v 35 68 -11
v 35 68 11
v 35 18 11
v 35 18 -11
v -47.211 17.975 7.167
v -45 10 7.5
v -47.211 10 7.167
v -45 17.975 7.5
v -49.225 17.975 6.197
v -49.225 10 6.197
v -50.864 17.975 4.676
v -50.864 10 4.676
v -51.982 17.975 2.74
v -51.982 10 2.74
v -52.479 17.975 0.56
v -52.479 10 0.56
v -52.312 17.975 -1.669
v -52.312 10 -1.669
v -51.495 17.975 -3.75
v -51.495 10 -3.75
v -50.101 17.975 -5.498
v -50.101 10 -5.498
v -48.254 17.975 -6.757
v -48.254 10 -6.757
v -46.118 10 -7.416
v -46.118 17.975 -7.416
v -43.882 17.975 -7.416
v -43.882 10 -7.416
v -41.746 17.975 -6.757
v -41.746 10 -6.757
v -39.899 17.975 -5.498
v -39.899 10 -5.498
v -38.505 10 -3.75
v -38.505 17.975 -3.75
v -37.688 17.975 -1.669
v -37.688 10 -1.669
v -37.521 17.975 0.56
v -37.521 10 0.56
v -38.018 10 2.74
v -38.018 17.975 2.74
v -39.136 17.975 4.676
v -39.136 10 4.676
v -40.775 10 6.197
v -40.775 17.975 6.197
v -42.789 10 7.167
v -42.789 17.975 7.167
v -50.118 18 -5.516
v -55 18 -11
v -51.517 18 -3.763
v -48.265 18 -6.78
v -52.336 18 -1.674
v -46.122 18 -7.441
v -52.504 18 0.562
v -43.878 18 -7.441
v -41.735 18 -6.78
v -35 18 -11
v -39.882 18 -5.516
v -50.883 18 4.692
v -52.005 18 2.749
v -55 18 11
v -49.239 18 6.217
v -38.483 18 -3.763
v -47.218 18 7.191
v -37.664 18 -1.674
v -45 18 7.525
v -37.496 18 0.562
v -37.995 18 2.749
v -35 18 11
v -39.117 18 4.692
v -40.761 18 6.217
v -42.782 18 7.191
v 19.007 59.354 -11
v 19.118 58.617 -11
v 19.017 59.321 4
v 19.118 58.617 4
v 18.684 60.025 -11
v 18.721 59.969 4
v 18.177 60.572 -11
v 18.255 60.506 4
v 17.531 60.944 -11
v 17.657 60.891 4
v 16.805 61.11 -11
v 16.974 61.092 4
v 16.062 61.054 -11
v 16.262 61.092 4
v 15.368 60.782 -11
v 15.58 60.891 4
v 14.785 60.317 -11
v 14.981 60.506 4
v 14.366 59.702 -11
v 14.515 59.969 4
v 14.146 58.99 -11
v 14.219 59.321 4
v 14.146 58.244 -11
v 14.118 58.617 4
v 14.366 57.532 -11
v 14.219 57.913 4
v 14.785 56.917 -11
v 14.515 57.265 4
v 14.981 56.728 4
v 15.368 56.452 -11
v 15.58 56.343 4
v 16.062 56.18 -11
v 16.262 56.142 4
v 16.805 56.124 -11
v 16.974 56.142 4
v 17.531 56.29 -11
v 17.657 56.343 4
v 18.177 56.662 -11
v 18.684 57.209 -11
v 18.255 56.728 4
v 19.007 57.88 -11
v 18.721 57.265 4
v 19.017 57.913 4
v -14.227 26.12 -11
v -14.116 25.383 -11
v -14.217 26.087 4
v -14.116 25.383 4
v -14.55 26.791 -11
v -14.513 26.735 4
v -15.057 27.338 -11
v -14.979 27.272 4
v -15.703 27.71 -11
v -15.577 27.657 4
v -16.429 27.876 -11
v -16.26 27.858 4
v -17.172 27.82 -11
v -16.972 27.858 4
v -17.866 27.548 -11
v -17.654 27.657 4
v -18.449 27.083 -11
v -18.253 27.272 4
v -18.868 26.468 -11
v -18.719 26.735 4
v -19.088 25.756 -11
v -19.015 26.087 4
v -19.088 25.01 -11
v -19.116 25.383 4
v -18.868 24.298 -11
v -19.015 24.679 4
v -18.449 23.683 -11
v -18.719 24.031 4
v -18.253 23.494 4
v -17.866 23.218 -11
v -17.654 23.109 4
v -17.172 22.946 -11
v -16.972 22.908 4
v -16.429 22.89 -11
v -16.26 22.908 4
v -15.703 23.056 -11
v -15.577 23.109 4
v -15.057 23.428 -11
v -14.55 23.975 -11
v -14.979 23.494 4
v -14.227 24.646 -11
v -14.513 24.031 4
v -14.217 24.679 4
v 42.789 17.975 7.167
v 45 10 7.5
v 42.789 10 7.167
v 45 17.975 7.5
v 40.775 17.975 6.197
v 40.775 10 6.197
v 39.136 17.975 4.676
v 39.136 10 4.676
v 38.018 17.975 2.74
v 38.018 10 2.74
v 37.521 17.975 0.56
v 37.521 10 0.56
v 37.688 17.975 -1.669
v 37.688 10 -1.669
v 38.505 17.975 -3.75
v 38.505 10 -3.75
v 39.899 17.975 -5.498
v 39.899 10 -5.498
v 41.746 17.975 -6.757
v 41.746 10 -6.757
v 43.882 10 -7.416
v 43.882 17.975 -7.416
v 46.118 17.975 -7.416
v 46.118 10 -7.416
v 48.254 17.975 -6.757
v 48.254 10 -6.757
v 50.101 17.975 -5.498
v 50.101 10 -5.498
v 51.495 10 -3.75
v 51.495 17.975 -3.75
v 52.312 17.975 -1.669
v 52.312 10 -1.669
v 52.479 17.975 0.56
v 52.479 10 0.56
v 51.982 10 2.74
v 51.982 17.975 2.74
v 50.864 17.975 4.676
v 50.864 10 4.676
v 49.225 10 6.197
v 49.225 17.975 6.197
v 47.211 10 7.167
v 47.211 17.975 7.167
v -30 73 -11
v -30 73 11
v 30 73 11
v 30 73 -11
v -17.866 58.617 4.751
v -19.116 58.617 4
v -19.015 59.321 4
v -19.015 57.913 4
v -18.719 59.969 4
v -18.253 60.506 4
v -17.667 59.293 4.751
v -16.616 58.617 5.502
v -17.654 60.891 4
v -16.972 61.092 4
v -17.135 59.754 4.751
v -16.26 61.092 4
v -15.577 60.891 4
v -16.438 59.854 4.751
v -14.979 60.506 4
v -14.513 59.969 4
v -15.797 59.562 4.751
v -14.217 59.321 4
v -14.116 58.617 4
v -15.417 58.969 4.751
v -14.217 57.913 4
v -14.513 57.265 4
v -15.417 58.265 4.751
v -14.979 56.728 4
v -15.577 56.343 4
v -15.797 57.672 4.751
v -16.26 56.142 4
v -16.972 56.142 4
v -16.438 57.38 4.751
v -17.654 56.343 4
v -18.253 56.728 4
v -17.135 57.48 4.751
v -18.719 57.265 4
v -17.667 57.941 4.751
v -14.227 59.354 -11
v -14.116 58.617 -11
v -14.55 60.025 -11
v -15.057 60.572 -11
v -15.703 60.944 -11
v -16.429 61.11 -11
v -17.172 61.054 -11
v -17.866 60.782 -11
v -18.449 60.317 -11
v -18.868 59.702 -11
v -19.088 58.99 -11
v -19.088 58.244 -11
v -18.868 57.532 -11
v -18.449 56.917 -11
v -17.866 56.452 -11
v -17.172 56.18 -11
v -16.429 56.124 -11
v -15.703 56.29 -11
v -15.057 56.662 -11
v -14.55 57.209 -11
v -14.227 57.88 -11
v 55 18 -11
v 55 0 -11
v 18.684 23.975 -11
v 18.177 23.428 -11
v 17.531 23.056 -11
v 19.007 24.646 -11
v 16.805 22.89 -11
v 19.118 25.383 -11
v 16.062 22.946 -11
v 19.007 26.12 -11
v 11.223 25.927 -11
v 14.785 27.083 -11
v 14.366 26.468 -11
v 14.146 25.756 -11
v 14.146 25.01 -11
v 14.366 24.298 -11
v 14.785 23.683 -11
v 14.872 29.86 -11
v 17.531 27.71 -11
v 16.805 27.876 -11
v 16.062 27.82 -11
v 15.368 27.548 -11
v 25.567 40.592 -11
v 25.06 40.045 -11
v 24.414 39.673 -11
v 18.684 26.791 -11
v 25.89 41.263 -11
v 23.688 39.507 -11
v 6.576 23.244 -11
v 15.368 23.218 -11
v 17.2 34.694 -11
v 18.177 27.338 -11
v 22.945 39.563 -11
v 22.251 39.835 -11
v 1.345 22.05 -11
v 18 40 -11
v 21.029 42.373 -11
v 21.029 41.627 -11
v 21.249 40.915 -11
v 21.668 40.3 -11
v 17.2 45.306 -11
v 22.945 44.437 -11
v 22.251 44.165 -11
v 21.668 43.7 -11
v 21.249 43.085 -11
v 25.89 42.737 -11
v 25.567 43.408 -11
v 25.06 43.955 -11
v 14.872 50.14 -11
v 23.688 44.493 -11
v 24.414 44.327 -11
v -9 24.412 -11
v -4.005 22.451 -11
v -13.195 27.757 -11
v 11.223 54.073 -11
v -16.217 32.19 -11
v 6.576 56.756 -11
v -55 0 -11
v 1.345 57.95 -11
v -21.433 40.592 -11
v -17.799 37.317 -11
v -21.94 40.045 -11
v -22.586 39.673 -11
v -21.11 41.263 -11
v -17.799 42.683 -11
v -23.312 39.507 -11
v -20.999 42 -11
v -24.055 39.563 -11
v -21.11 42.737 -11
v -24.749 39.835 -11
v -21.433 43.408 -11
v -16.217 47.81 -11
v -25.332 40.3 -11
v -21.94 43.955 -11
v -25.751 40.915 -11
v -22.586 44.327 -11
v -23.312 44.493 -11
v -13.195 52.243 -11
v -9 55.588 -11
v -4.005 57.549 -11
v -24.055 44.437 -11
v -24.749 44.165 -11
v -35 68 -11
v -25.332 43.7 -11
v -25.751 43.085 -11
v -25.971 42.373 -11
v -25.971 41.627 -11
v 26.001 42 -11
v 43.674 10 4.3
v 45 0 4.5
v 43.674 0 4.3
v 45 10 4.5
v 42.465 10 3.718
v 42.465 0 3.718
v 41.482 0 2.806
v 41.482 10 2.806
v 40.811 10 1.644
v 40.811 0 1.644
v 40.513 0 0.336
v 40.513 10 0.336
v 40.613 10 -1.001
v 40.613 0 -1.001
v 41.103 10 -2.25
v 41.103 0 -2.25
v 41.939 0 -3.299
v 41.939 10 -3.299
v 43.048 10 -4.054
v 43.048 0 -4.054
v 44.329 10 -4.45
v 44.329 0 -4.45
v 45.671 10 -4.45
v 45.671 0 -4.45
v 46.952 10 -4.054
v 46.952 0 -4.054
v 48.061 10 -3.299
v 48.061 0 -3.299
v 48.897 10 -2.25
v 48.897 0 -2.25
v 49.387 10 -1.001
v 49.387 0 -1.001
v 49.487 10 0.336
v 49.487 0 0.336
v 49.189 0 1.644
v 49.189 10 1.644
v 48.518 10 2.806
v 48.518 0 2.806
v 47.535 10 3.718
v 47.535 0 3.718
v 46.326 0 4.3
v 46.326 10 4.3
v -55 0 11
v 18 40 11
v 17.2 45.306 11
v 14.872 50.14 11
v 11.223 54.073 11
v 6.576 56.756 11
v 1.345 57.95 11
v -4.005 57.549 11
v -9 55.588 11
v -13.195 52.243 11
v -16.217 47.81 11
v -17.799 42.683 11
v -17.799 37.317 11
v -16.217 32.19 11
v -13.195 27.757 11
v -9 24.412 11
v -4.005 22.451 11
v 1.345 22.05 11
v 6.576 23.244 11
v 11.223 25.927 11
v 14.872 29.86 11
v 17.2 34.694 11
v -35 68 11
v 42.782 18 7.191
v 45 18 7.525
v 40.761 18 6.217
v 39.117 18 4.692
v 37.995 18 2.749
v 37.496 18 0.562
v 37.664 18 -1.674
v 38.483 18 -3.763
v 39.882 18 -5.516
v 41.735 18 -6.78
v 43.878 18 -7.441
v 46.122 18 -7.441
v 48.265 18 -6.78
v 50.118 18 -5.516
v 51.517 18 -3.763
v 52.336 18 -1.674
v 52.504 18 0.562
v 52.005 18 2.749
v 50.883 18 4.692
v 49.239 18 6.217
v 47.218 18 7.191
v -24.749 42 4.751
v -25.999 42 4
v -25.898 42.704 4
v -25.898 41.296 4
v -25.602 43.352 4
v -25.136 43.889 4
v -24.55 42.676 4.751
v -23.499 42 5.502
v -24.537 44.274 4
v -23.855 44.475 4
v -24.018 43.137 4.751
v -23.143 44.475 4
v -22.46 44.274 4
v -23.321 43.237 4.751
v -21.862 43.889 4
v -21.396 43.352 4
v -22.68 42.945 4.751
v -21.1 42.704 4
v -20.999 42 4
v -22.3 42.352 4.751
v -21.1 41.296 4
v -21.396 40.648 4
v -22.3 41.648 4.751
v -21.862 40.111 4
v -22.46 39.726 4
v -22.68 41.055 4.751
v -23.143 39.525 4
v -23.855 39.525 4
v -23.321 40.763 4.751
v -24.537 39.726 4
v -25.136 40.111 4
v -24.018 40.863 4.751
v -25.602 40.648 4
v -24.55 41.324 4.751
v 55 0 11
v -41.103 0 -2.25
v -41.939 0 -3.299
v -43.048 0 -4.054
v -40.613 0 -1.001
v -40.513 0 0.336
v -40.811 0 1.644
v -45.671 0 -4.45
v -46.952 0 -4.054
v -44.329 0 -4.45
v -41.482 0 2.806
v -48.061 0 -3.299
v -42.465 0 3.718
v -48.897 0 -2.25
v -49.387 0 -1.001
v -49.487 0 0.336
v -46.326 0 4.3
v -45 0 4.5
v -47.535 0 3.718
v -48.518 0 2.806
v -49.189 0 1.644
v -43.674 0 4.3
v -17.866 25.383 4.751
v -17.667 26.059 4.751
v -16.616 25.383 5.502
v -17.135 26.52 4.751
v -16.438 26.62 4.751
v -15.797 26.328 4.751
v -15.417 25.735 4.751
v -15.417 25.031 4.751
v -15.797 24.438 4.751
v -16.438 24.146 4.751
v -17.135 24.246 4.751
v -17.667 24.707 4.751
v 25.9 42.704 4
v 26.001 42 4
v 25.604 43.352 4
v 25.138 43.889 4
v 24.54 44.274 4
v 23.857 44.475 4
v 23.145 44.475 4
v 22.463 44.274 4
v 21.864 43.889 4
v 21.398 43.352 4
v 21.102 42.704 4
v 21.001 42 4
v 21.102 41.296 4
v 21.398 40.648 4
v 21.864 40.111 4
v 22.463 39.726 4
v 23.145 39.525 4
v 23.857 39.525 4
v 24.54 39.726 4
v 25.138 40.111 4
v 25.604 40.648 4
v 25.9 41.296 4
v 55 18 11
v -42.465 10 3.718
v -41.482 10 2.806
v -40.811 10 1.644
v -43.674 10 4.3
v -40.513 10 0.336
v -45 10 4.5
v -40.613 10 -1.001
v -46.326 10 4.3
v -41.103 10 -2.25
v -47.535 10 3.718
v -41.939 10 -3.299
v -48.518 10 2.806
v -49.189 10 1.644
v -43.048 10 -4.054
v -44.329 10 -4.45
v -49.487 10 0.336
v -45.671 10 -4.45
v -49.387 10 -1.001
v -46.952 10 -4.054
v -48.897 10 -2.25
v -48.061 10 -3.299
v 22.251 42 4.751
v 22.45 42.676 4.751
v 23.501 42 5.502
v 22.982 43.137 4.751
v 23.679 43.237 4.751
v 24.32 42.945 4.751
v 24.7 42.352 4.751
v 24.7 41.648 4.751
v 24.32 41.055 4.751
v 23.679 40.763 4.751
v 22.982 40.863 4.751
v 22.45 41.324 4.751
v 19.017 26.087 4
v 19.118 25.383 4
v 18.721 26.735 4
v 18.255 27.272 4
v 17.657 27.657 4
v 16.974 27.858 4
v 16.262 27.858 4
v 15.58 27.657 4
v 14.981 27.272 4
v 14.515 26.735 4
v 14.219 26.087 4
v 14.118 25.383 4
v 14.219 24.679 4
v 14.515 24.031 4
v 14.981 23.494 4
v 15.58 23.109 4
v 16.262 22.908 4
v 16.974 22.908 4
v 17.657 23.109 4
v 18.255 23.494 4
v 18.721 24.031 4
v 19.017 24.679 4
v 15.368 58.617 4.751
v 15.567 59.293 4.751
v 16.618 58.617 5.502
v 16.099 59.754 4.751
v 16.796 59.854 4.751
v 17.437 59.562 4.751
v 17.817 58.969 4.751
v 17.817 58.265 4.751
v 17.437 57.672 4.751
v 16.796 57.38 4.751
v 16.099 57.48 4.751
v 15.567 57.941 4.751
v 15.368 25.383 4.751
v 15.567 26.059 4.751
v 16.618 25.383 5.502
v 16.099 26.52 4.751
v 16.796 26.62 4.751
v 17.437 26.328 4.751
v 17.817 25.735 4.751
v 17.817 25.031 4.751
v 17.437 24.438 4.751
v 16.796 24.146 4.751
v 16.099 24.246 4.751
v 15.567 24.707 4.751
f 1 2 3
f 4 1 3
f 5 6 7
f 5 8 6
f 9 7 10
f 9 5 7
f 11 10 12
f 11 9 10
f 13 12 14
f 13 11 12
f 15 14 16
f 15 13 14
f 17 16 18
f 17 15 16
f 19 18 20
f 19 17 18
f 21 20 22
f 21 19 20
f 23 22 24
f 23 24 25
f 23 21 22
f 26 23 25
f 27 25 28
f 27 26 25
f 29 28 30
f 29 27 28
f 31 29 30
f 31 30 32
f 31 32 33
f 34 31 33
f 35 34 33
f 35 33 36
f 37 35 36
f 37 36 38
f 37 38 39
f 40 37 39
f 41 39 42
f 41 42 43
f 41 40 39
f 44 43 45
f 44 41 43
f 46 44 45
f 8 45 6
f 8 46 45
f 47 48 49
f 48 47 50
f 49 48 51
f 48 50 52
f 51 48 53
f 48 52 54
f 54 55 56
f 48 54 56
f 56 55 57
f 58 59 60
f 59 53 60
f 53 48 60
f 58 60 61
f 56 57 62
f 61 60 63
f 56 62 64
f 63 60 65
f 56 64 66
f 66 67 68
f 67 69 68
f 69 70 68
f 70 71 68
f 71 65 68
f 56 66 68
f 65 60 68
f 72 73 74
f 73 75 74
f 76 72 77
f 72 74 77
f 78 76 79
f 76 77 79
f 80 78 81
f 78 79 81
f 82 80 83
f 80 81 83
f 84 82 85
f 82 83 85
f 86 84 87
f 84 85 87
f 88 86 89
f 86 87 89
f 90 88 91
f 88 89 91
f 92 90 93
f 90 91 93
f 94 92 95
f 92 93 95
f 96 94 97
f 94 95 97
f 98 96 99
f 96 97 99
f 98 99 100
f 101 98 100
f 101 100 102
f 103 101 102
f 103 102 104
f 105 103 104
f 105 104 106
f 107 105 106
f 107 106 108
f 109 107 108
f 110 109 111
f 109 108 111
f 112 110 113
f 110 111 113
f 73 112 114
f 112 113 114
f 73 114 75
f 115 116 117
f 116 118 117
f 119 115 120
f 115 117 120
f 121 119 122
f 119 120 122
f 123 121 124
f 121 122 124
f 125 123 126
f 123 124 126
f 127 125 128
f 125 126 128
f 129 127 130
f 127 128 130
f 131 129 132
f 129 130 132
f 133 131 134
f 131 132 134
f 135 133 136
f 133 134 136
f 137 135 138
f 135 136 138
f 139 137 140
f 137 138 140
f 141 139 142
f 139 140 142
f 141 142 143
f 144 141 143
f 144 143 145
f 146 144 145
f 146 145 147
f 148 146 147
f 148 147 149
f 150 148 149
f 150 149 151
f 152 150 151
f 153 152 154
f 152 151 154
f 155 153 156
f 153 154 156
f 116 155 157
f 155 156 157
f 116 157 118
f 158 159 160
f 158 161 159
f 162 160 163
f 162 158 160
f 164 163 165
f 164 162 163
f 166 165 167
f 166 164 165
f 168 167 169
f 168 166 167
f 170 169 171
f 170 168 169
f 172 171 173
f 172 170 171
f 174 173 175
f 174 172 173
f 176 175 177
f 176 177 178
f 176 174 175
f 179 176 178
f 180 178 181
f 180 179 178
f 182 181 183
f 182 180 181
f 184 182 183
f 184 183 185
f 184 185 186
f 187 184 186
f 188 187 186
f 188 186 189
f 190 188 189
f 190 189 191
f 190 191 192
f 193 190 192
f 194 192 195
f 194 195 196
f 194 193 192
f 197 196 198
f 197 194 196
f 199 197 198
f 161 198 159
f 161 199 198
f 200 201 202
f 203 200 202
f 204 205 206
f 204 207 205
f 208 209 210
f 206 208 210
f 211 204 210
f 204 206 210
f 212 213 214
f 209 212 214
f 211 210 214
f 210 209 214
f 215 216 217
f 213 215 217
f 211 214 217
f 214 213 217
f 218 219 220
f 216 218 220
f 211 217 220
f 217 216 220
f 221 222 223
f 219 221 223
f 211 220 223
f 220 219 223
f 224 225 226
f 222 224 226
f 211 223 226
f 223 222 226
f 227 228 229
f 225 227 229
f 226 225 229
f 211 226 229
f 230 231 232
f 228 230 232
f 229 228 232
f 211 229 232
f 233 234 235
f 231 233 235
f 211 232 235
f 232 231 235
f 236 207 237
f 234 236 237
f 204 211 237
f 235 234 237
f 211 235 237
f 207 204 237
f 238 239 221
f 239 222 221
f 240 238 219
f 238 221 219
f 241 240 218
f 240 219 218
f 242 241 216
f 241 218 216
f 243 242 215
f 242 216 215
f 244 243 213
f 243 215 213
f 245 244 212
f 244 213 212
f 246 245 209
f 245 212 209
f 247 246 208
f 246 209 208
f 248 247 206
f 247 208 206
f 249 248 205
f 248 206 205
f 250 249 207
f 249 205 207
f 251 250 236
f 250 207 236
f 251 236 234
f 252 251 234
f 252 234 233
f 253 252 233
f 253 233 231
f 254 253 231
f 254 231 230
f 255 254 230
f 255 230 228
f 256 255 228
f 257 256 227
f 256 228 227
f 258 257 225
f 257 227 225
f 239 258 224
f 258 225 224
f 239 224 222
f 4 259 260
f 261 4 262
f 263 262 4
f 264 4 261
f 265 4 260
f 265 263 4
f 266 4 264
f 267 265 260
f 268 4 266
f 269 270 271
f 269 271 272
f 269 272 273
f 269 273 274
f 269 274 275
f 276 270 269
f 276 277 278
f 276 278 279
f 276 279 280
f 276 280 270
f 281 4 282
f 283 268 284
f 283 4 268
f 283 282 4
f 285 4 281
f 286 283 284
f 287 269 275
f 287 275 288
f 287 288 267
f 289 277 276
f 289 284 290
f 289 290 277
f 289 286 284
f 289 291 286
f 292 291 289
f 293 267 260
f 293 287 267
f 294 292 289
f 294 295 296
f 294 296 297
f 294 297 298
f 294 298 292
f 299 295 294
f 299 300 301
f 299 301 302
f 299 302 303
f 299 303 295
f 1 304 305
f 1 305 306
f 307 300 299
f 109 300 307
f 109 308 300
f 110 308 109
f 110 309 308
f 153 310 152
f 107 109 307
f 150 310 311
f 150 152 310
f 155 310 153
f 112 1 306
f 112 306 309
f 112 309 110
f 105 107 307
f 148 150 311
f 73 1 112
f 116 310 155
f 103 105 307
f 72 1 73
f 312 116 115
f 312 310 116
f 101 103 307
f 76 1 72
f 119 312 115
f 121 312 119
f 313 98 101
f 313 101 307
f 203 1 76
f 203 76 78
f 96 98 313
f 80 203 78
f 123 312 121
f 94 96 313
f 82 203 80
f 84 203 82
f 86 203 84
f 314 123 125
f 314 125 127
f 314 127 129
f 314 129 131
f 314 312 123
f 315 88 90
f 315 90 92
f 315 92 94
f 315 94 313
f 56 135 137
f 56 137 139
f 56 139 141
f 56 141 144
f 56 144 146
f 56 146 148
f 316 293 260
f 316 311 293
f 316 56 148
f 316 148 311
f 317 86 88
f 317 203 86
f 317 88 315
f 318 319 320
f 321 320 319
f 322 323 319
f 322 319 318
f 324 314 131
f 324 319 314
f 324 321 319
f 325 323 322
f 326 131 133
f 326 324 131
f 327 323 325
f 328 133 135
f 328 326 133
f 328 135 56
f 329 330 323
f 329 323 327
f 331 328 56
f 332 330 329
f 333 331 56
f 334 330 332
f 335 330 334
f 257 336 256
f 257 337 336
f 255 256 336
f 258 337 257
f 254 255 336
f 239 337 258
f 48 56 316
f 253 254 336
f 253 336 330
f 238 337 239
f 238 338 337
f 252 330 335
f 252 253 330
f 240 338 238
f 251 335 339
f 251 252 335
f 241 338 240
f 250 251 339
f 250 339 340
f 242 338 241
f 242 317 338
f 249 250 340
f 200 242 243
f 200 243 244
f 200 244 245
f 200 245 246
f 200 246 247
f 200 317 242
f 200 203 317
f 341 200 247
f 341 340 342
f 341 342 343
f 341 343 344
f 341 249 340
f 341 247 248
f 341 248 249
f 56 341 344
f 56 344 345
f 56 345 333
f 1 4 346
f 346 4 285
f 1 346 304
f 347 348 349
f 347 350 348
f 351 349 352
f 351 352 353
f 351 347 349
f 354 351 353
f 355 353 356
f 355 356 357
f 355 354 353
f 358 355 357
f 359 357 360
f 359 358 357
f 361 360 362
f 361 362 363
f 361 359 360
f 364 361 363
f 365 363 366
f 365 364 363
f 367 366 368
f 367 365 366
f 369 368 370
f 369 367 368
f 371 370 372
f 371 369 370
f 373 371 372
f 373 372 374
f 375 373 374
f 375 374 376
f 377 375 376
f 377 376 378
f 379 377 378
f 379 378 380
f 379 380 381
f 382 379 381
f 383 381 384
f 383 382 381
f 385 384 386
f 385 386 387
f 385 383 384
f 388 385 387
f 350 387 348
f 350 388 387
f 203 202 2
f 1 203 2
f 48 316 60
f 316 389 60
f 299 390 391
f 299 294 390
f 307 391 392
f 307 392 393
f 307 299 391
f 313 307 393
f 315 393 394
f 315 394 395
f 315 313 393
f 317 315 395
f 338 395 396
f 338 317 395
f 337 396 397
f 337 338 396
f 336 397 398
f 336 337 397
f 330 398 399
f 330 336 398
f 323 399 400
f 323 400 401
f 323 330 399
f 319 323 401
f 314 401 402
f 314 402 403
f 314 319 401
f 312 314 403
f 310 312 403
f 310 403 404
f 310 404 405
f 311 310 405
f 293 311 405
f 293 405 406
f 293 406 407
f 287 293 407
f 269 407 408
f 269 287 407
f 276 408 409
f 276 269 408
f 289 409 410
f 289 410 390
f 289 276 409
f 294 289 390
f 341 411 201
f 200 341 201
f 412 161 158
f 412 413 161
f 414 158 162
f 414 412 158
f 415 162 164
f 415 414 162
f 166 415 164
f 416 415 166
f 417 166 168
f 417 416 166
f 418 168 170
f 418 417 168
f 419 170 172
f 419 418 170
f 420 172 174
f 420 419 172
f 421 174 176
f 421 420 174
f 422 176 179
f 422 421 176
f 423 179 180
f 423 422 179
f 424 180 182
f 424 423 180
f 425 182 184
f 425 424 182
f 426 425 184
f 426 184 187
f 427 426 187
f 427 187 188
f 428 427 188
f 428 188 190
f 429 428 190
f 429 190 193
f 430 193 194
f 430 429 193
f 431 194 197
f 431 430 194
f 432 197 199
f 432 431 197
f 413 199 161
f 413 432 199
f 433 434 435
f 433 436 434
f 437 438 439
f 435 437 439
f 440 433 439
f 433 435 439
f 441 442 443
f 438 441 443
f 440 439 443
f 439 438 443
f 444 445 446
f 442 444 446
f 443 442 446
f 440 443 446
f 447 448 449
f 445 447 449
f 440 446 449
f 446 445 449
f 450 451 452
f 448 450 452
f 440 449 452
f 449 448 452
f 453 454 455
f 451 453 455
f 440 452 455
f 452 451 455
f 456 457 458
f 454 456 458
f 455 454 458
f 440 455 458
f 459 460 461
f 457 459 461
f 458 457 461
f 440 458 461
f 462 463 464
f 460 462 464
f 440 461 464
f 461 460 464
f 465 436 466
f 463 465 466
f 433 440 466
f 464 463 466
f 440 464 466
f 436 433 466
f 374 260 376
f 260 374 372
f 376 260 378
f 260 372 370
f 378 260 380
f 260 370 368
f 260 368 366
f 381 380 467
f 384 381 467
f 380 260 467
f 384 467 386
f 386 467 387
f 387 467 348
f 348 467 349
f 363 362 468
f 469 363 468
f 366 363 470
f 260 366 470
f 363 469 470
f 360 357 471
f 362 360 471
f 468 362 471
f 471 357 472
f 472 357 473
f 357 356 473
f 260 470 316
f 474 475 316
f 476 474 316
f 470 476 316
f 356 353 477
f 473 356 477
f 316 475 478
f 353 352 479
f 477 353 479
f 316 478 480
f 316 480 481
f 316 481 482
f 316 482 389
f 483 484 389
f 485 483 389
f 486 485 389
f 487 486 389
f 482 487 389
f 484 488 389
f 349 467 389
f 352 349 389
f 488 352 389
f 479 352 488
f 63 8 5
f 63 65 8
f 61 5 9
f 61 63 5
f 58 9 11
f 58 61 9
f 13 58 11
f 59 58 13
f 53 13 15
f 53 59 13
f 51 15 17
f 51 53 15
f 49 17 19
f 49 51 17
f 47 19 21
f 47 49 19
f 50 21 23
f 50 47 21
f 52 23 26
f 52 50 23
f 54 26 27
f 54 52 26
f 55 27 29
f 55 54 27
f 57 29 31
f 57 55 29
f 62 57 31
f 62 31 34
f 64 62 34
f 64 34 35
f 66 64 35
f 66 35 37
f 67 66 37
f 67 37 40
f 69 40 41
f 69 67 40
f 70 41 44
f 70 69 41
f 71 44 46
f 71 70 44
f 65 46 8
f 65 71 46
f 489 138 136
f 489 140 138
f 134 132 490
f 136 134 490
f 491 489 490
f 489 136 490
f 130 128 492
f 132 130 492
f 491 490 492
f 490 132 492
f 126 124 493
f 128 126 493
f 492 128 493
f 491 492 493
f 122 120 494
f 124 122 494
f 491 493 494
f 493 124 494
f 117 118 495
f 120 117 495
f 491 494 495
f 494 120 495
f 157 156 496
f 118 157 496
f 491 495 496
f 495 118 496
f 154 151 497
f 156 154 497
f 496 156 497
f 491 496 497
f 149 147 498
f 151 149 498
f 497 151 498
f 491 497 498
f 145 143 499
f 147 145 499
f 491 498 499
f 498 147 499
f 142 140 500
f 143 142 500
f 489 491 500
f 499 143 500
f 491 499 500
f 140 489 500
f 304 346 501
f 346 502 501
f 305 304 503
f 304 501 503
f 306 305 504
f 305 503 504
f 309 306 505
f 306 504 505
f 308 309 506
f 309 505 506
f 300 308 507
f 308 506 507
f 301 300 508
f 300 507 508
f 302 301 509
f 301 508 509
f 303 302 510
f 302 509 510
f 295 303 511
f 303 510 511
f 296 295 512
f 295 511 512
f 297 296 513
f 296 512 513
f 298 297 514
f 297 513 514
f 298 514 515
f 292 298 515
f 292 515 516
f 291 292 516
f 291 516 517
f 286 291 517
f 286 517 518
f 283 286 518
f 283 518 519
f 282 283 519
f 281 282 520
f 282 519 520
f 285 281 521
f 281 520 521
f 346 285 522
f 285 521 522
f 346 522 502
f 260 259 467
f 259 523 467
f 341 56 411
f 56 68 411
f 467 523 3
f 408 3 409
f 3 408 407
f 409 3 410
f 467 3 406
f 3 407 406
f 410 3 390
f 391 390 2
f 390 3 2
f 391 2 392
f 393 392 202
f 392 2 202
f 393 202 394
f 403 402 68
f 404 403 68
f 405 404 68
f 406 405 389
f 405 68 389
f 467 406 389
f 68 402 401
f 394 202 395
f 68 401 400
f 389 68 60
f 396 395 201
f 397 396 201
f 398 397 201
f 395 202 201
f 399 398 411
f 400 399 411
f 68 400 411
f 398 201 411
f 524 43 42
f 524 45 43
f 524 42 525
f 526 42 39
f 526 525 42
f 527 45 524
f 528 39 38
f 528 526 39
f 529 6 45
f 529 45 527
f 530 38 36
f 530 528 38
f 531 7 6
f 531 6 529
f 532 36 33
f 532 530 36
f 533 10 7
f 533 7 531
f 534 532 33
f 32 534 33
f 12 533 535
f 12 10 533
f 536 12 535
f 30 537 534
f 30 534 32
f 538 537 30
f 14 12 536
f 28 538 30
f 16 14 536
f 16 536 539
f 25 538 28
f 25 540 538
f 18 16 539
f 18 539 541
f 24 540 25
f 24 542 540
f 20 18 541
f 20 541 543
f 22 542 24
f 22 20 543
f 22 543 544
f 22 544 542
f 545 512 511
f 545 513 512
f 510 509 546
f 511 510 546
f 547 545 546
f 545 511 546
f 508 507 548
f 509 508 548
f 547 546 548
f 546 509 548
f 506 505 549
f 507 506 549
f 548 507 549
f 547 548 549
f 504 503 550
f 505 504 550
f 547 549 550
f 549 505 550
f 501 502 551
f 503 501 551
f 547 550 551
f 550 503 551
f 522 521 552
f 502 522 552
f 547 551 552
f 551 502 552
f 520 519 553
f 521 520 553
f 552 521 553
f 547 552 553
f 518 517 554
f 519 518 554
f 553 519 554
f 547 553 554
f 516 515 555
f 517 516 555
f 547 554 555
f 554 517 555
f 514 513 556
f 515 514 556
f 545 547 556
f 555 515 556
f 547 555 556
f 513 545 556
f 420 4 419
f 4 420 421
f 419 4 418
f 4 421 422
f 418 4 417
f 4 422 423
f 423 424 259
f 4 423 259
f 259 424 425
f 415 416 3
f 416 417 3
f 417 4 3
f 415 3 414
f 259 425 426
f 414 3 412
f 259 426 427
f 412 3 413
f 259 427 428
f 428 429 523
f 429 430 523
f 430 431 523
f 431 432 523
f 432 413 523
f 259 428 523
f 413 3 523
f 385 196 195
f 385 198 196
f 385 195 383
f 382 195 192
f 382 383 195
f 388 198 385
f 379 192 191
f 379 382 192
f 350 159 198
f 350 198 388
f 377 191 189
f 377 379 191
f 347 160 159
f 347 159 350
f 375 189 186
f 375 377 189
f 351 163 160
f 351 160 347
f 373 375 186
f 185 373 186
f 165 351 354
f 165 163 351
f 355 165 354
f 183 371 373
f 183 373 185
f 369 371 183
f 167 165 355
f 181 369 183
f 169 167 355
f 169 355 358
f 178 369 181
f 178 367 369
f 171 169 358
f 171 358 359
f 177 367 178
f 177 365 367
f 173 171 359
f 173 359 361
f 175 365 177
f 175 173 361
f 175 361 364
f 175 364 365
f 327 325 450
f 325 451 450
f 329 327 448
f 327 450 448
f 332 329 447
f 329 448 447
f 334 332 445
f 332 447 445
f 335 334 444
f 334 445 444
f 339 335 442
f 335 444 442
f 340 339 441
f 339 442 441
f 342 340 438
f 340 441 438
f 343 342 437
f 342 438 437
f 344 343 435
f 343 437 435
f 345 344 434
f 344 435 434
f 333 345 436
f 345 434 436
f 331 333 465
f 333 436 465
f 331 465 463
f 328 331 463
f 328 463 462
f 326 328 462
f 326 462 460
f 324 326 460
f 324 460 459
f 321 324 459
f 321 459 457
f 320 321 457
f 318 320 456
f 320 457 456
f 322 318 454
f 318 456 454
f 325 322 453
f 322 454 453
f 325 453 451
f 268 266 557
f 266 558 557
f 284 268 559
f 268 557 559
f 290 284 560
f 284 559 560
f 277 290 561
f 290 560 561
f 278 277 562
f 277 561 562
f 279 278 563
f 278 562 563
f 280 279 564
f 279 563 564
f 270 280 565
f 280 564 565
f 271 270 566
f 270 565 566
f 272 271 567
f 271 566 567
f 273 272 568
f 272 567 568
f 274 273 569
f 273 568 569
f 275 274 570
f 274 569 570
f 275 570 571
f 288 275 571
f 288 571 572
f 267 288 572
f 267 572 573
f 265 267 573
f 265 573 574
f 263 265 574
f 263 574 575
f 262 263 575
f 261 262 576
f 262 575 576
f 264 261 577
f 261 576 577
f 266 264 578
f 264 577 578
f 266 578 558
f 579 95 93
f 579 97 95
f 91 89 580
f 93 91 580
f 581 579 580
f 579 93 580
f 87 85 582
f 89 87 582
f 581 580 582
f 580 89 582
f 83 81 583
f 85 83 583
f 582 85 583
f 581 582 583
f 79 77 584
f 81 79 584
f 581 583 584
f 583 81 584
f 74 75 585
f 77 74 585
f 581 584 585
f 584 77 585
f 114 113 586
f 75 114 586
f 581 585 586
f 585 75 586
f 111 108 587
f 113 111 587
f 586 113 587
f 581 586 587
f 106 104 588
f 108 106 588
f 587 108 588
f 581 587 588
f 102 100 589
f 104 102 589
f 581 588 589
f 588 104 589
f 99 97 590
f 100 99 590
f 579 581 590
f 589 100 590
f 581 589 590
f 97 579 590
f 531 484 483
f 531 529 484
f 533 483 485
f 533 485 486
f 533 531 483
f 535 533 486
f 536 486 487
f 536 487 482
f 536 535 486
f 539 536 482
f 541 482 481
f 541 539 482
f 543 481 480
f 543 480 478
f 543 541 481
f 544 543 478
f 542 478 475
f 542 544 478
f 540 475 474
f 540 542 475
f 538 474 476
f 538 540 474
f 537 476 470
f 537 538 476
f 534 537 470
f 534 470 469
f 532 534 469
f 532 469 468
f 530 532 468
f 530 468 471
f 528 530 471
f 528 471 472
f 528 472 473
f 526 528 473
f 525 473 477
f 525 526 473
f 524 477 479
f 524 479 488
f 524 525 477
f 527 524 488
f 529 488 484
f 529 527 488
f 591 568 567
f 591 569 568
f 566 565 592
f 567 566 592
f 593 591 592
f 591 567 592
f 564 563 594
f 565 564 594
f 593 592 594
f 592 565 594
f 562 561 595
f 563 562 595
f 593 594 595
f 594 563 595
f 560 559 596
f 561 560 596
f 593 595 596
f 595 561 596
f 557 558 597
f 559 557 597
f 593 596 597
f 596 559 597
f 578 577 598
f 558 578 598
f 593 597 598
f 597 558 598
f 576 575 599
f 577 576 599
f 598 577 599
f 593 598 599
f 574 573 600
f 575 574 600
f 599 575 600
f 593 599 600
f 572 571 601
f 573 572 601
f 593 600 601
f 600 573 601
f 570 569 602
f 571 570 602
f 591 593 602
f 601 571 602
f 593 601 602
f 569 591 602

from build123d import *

# Parameters (mm, degrees)
SKETCH_1_R                  = 18
EXTRUDE_1_DEPTH             = 11
HOLE_WIZARD_M8_1_AT_2_COUNT = 2
HOLE_WIZARD_M8_1_AT_2_PITCH = 90
HOLE_WIZARD_M6_1_D          = 5
HOLE_WIZARD_M6_1_DEPTH      = 15
HOLE_WIZARD_M6_1_TIP        = 1.502151548


with BuildPart() as part:
    # 草图1 → 拉伸1 (new, symmetric)
    with BuildSketch(Plane.XY):
        Polygon((35, 18), (55, 18), (55, 0), (-55, 0), (-55, 18), (-35, 18), (-35, 68), (-30, 73), (30, 73), (35, 68), align=None)
        with Locations((0, 40)):
            Circle(SKETCH_1_R, mode=Mode.SUBTRACT)
    extrude(amount=EXTRUDE_1_DEPTH, both=True)

    # 草图2 → M8 六角凹头螺钉的柱形沉头孔1 (revolve, cut)
    with BuildSketch(Plane(origin=(-45, 18, 0), x_dir=(0, 0, 1), z_dir=(1, 0, 0))):
        Polygon((0, 0), (0, 18), (4.5, 18), (4.5, 8), (7.5, 8), (7.5, 0.025), (7.525, 0), align=None)
    hole_wizard_m8_1 = revolve(axis=Axis((-45, 24.35, 0), (0, -1, 0)), mode=Mode.SUBTRACT)

    # M8 六角凹头螺钉的柱形沉头孔1 at 2: M8 六角凹头螺钉的柱形沉头孔1 ×2
    with Locations(*[(i * HOLE_WIZARD_M8_1_AT_2_PITCH, 0, 0) for i in range(1, HOLE_WIZARD_M8_1_AT_2_COUNT)]):
        add(hole_wizard_m8_1, mode=Mode.SUBTRACT)

    # M6 螺纹孔1
    with Locations(Plane(origin=(0, 0, -11), x_dir=(-1, 0, 0), z_dir=(0, 0, -1))):
        with Locations((16.615900688, 25.382990642), (-16.618118028, 25.382990642), (-23.50110867, 42), (-16.618118028, 58.617009358), (16.615900688, 58.617009358), (23.49889133, 42)):
            Hole(HOLE_WIZARD_M6_1_D / 2, depth=HOLE_WIZARD_M6_1_DEPTH)
            with Locations((0, 0, -(HOLE_WIZARD_M6_1_DEPTH + HOLE_WIZARD_M6_1_TIP / 2))):  # 118° drill point
                Cone(0, HOLE_WIZARD_M6_1_D / 2, HOLE_WIZARD_M6_1_TIP, mode=Mode.SUBTRACT)


solid = part.part
